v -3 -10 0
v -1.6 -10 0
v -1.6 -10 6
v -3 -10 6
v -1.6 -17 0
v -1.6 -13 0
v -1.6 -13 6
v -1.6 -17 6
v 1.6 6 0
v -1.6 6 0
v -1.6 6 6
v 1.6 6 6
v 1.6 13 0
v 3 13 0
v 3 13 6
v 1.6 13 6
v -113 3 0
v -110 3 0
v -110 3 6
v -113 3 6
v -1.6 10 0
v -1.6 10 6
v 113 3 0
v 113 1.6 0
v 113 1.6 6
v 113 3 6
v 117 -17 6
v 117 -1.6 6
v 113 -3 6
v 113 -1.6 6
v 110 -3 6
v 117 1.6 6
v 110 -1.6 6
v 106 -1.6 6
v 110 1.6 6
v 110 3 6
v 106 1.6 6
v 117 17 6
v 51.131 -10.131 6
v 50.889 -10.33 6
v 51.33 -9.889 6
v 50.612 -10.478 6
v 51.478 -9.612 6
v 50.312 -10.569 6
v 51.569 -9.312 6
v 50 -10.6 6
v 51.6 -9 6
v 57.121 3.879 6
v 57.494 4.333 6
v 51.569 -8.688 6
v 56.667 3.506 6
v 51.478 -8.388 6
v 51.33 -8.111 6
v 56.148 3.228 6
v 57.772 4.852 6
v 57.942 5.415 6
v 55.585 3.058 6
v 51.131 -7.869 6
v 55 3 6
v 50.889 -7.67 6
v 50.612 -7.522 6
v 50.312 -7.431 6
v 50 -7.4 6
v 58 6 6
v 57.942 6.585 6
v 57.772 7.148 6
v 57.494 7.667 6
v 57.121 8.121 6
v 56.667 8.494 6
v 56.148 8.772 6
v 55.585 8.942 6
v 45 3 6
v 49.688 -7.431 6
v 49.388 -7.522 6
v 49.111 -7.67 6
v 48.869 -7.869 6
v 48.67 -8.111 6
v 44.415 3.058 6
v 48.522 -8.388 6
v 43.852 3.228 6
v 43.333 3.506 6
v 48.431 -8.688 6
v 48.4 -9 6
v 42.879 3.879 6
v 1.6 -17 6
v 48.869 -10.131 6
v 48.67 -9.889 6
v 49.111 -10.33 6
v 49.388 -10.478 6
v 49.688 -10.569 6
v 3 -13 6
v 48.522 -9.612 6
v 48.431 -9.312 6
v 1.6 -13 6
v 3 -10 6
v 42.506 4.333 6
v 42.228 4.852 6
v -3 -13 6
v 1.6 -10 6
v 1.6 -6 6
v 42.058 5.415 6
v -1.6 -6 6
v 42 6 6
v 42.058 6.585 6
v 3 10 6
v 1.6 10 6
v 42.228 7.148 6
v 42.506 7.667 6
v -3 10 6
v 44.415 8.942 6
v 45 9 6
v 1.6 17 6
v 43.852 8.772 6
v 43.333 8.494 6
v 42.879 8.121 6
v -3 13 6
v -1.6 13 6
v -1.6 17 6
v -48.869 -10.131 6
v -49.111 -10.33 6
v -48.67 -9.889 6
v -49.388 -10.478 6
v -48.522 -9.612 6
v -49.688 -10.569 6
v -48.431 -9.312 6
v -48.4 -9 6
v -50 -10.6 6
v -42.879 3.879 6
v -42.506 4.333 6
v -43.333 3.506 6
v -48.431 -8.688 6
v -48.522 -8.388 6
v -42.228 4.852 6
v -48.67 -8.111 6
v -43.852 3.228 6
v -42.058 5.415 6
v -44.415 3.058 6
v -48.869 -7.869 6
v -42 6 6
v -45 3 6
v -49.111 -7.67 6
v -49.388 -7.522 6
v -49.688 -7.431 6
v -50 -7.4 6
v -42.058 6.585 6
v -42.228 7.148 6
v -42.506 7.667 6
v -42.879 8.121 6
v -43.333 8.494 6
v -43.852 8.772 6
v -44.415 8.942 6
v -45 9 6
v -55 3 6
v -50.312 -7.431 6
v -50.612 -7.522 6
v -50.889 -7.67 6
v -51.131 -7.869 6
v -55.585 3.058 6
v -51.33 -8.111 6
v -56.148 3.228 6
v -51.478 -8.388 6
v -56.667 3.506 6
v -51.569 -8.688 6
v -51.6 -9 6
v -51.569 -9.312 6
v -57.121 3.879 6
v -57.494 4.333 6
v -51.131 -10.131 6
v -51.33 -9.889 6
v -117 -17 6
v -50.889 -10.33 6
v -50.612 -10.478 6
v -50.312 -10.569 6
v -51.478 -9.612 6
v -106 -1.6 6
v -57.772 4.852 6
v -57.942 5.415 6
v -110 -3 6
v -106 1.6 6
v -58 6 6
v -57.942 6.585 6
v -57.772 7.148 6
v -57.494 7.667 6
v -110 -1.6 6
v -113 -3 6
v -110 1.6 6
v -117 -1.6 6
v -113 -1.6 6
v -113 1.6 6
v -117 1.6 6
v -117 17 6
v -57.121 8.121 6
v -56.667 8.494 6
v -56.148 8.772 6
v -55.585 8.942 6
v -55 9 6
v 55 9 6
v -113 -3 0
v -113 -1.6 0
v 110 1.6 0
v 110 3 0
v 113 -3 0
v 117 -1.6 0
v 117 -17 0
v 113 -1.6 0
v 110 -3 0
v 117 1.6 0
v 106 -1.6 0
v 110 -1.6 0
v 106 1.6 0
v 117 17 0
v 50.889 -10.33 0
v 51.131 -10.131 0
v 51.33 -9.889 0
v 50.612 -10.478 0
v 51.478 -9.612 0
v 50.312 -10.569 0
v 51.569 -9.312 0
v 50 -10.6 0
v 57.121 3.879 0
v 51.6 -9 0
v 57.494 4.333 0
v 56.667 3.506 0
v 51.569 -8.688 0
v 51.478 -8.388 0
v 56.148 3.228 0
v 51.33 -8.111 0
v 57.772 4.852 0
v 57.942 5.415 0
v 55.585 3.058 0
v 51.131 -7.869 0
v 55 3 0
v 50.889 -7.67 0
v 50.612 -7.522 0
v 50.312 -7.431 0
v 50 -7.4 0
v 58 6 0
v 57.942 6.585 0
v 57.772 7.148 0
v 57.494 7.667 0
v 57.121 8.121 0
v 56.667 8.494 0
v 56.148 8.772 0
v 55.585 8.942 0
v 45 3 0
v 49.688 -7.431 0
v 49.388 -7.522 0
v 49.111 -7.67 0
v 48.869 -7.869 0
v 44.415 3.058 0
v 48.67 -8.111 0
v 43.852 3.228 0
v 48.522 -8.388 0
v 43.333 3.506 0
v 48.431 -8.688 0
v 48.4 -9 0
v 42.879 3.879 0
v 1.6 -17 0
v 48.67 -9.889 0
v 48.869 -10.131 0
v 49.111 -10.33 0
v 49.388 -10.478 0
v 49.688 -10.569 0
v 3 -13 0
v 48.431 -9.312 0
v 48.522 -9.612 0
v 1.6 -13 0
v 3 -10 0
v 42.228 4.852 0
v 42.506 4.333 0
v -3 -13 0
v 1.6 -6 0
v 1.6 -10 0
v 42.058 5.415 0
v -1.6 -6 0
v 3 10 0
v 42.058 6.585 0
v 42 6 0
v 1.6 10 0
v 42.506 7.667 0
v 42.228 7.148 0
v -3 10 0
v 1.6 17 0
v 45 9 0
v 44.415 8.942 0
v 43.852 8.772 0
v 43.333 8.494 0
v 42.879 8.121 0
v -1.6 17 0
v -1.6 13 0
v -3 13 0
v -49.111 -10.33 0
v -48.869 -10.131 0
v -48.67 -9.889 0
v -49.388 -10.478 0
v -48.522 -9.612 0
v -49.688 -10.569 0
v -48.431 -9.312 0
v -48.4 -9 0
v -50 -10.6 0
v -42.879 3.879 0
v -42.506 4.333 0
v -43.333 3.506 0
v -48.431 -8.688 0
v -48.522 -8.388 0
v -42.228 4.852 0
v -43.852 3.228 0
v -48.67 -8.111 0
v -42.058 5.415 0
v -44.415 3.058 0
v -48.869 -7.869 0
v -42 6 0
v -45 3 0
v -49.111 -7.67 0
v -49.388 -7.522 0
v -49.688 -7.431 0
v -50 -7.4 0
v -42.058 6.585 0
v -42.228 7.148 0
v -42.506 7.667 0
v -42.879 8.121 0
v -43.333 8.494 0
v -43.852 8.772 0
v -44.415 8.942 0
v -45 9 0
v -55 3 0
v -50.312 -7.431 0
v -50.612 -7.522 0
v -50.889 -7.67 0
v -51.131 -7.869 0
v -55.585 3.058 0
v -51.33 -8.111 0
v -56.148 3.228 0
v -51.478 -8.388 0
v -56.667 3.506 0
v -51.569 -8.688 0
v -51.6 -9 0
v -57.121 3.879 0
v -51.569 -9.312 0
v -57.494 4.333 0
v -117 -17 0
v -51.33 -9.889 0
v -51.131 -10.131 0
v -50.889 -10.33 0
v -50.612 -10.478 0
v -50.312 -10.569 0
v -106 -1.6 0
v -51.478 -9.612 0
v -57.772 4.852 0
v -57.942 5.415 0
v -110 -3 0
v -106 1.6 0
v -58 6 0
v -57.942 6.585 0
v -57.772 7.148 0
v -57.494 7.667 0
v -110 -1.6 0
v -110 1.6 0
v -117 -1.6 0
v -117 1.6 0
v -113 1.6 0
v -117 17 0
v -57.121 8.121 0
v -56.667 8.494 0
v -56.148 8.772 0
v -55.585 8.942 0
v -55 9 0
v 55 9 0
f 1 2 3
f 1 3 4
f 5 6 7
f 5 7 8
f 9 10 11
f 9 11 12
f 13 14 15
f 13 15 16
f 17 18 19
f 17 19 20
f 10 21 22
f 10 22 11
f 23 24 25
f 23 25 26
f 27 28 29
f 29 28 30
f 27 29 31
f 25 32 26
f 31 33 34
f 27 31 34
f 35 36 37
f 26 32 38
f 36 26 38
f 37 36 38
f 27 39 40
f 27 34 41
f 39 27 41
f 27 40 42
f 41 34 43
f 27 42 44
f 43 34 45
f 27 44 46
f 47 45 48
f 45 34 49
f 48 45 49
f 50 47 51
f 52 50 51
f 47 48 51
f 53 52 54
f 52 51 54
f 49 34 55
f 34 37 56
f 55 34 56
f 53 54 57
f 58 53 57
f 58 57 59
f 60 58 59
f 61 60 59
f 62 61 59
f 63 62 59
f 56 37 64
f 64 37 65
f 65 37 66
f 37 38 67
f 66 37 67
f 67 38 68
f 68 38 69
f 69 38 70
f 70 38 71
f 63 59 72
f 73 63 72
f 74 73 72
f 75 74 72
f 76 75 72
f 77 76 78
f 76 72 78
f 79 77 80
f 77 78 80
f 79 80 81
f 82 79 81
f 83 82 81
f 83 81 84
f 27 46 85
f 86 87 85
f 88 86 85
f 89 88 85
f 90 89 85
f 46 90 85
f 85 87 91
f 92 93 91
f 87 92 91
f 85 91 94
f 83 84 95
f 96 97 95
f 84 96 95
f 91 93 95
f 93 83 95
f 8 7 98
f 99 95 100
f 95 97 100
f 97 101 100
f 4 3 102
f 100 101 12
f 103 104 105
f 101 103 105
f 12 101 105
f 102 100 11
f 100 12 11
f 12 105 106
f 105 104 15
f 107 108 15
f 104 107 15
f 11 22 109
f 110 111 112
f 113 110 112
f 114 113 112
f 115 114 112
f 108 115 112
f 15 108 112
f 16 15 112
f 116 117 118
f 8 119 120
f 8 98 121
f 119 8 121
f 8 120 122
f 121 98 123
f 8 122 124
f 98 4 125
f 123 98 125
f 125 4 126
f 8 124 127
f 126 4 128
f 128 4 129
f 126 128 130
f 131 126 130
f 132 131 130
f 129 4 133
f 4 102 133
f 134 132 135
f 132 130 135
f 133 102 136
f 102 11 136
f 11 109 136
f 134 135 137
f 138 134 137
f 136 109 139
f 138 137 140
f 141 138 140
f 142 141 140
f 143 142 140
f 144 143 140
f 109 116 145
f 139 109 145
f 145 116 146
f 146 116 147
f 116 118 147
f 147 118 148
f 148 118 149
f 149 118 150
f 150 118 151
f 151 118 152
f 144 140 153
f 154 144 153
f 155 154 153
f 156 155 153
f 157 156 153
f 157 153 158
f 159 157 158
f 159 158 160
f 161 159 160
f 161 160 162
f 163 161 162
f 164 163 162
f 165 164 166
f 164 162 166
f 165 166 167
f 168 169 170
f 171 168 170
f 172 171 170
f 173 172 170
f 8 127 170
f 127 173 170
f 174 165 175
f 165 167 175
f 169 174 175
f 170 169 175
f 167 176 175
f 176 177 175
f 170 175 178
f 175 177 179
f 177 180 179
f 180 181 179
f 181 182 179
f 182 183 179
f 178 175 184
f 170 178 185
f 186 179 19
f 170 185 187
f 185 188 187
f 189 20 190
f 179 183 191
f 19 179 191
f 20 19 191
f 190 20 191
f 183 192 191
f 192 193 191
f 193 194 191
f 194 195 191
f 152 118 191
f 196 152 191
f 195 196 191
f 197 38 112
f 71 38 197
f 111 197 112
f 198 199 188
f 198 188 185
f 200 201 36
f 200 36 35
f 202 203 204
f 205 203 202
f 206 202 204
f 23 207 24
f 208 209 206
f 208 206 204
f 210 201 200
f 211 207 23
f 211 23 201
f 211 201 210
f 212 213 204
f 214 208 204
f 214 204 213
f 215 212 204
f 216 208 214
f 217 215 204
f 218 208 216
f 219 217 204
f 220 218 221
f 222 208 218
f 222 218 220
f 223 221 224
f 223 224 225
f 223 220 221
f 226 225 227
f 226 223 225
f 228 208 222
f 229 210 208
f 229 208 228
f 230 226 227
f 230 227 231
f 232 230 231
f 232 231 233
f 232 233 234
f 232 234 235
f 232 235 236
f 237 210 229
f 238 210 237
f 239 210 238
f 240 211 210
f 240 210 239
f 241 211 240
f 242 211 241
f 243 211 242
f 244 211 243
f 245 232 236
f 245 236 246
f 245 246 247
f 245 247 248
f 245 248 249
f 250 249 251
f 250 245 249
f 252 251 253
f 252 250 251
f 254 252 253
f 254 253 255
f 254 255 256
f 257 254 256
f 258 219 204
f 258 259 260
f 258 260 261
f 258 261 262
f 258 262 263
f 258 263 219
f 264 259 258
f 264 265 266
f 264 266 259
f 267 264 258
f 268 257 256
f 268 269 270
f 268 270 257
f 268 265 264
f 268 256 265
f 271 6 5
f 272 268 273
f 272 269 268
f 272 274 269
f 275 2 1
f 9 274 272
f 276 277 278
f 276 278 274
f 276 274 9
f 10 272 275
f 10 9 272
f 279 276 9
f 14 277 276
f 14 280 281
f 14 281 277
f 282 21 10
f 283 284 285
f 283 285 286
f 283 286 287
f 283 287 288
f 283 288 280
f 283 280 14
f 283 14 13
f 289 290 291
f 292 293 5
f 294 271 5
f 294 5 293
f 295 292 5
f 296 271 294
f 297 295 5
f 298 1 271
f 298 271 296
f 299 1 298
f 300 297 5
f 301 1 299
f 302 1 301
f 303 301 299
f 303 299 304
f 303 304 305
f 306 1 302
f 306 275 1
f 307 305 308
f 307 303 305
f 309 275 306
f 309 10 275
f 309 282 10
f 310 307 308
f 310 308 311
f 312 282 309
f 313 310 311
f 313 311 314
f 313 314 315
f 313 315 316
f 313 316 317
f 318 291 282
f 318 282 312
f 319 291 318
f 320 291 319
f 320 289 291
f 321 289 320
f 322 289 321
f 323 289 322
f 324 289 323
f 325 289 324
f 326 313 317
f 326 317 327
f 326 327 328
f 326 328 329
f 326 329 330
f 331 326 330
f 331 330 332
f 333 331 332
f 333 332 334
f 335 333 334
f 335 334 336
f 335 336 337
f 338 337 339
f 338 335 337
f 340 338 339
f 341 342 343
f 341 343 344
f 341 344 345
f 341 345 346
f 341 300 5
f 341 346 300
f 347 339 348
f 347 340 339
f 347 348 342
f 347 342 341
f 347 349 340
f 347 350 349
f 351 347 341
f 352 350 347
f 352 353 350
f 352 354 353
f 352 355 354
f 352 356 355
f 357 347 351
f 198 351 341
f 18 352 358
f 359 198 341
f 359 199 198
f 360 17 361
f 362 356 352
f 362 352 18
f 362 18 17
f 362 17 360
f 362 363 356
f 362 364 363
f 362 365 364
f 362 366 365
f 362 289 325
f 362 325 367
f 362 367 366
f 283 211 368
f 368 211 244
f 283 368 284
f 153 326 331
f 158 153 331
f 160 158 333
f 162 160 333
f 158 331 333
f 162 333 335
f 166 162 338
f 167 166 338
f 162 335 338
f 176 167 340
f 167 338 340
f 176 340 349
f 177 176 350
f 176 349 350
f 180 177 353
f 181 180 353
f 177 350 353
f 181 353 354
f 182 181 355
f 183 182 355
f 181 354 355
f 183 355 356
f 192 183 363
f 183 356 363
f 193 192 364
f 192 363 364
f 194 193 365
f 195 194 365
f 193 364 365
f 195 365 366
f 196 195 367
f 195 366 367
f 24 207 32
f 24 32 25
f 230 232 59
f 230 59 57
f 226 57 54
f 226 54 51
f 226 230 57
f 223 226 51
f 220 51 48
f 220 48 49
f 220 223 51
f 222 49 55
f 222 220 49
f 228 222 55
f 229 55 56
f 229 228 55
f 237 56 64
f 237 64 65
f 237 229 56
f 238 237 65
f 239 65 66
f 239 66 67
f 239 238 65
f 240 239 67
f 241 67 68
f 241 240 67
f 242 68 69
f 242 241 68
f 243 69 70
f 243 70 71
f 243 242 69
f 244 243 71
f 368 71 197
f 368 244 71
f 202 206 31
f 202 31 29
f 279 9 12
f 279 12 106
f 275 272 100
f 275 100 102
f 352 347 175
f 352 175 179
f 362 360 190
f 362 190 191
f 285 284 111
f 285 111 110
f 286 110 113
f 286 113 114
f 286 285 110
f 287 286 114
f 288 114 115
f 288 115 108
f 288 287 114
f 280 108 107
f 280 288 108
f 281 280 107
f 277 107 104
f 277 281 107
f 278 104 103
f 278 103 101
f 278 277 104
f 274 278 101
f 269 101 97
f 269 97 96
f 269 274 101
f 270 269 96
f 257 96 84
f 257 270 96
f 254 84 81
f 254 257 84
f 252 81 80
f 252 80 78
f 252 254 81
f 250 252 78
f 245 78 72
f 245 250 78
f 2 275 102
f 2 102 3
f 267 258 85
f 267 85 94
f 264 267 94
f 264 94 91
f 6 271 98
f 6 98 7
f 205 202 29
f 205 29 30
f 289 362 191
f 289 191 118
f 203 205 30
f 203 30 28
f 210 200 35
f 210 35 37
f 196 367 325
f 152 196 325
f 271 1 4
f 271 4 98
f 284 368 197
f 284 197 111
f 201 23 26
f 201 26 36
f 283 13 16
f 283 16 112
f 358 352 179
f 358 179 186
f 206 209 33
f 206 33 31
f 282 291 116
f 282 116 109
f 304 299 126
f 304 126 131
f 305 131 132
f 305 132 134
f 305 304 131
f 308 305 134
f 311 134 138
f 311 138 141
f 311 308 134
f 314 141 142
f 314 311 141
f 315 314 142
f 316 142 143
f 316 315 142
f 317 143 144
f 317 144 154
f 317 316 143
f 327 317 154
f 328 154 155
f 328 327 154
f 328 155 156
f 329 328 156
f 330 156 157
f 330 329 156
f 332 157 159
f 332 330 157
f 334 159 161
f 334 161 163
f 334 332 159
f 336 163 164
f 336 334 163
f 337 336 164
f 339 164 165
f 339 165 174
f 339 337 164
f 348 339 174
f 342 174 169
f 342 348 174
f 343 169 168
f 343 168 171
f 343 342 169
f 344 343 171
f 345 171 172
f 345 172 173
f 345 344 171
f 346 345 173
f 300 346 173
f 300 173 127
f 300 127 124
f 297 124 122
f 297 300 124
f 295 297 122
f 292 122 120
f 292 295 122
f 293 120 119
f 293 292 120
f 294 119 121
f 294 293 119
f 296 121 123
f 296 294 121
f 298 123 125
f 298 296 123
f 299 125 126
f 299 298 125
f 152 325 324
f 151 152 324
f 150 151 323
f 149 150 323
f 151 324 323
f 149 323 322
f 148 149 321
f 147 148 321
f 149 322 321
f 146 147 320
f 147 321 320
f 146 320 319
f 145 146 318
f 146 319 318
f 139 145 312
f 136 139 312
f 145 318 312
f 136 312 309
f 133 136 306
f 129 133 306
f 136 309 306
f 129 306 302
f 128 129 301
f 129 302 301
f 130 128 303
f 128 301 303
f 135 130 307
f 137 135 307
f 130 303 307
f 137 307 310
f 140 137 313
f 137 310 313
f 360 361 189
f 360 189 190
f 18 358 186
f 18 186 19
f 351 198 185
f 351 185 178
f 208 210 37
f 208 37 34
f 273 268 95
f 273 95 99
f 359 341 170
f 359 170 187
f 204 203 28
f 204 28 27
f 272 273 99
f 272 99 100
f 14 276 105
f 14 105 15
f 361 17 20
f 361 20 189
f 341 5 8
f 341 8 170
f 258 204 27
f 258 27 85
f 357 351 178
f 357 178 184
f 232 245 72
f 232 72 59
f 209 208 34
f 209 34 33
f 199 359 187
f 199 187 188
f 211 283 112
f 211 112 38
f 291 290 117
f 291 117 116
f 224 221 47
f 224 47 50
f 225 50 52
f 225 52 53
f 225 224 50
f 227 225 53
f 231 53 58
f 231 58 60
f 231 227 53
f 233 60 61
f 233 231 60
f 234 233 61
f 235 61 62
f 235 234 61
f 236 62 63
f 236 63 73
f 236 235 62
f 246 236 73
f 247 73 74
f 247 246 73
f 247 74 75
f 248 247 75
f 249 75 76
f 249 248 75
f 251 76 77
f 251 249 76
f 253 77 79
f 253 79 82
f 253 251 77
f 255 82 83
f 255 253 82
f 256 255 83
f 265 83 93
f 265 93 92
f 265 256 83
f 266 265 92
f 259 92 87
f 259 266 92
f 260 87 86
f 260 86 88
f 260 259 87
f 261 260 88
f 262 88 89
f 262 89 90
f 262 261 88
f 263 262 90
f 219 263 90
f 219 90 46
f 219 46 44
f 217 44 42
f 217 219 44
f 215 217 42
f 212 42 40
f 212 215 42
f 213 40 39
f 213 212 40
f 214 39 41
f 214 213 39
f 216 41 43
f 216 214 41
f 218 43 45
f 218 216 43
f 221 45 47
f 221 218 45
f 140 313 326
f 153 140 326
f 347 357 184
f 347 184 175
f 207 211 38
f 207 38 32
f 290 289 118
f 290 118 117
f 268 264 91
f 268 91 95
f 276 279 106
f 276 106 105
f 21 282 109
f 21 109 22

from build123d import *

# Parameters (mm, degrees)
ESBO_O1_R                = 1.6
RESSALTO_EXTRUS_O1_DEPTH = 6


with BuildPart() as part:
    # Esboço1 → Ressalto-extrusão1 (new body)
    with BuildSketch(Plane.XY):
        Polygon((117, 17), (117, 1.6), (113, 1.6), (113, 3), (110, 3), (110, 1.6), (106, 1.6), (106, -1.6), (110, -1.6), (110, -3), (113, -3), (113, -1.6), (117, -1.6), (117, -17), (1.6, -17), (1.6, -13), (3, -13), (3, -10), (1.6, -10), (1.6, -6), (-1.6, -6), (-1.6, -10), (-3, -10), (-3, -13), (-1.6, -13), (-1.6, -17), (-117, -17), (-117, -1.6), (-113, -1.6), (-113, -3), (-110, -3), (-110, -1.6), (-106, -1.6), (-106, 1.6), (-110, 1.6), (-110, 3), (-113, 3), (-113, 1.6), (-117, 1.6), (-117, 17), (-1.6, 17), (-1.6, 13), (-3, 13), (-3, 10), (-1.6, 10), (-1.6, 6), (1.6, 6), (1.6, 10), (3, 10), (3, 13), (1.6, 13), (1.6, 17), align=None)
        with Locations((-50, -9)):
            Circle(ESBO_O1_R, mode=Mode.SUBTRACT)
        with Locations((50, -9)):
            Circle(ESBO_O1_R, mode=Mode.SUBTRACT)
        with BuildLine():
            Line((-55, 9), (-45, 9))
            ThreePointArc((-45, 9), (-42, 6), (-45, 3))
            Line((-45, 3), (-55, 3))
            ThreePointArc((-55, 3), (-58, 6), (-55, 9))
        make_face(mode=Mode.SUBTRACT)
        with BuildLine():
            Line((55, 9), (45, 9))
            ThreePointArc((45, 9), (42, 6), (45, 3))
            Line((45, 3), (55, 3))
            ThreePointArc((55, 3), (58, 6), (55, 9))
        make_face(mode=Mode.SUBTRACT)
    extrude(amount=RESSALTO_EXTRUS_O1_DEPTH)


solid = part.part
